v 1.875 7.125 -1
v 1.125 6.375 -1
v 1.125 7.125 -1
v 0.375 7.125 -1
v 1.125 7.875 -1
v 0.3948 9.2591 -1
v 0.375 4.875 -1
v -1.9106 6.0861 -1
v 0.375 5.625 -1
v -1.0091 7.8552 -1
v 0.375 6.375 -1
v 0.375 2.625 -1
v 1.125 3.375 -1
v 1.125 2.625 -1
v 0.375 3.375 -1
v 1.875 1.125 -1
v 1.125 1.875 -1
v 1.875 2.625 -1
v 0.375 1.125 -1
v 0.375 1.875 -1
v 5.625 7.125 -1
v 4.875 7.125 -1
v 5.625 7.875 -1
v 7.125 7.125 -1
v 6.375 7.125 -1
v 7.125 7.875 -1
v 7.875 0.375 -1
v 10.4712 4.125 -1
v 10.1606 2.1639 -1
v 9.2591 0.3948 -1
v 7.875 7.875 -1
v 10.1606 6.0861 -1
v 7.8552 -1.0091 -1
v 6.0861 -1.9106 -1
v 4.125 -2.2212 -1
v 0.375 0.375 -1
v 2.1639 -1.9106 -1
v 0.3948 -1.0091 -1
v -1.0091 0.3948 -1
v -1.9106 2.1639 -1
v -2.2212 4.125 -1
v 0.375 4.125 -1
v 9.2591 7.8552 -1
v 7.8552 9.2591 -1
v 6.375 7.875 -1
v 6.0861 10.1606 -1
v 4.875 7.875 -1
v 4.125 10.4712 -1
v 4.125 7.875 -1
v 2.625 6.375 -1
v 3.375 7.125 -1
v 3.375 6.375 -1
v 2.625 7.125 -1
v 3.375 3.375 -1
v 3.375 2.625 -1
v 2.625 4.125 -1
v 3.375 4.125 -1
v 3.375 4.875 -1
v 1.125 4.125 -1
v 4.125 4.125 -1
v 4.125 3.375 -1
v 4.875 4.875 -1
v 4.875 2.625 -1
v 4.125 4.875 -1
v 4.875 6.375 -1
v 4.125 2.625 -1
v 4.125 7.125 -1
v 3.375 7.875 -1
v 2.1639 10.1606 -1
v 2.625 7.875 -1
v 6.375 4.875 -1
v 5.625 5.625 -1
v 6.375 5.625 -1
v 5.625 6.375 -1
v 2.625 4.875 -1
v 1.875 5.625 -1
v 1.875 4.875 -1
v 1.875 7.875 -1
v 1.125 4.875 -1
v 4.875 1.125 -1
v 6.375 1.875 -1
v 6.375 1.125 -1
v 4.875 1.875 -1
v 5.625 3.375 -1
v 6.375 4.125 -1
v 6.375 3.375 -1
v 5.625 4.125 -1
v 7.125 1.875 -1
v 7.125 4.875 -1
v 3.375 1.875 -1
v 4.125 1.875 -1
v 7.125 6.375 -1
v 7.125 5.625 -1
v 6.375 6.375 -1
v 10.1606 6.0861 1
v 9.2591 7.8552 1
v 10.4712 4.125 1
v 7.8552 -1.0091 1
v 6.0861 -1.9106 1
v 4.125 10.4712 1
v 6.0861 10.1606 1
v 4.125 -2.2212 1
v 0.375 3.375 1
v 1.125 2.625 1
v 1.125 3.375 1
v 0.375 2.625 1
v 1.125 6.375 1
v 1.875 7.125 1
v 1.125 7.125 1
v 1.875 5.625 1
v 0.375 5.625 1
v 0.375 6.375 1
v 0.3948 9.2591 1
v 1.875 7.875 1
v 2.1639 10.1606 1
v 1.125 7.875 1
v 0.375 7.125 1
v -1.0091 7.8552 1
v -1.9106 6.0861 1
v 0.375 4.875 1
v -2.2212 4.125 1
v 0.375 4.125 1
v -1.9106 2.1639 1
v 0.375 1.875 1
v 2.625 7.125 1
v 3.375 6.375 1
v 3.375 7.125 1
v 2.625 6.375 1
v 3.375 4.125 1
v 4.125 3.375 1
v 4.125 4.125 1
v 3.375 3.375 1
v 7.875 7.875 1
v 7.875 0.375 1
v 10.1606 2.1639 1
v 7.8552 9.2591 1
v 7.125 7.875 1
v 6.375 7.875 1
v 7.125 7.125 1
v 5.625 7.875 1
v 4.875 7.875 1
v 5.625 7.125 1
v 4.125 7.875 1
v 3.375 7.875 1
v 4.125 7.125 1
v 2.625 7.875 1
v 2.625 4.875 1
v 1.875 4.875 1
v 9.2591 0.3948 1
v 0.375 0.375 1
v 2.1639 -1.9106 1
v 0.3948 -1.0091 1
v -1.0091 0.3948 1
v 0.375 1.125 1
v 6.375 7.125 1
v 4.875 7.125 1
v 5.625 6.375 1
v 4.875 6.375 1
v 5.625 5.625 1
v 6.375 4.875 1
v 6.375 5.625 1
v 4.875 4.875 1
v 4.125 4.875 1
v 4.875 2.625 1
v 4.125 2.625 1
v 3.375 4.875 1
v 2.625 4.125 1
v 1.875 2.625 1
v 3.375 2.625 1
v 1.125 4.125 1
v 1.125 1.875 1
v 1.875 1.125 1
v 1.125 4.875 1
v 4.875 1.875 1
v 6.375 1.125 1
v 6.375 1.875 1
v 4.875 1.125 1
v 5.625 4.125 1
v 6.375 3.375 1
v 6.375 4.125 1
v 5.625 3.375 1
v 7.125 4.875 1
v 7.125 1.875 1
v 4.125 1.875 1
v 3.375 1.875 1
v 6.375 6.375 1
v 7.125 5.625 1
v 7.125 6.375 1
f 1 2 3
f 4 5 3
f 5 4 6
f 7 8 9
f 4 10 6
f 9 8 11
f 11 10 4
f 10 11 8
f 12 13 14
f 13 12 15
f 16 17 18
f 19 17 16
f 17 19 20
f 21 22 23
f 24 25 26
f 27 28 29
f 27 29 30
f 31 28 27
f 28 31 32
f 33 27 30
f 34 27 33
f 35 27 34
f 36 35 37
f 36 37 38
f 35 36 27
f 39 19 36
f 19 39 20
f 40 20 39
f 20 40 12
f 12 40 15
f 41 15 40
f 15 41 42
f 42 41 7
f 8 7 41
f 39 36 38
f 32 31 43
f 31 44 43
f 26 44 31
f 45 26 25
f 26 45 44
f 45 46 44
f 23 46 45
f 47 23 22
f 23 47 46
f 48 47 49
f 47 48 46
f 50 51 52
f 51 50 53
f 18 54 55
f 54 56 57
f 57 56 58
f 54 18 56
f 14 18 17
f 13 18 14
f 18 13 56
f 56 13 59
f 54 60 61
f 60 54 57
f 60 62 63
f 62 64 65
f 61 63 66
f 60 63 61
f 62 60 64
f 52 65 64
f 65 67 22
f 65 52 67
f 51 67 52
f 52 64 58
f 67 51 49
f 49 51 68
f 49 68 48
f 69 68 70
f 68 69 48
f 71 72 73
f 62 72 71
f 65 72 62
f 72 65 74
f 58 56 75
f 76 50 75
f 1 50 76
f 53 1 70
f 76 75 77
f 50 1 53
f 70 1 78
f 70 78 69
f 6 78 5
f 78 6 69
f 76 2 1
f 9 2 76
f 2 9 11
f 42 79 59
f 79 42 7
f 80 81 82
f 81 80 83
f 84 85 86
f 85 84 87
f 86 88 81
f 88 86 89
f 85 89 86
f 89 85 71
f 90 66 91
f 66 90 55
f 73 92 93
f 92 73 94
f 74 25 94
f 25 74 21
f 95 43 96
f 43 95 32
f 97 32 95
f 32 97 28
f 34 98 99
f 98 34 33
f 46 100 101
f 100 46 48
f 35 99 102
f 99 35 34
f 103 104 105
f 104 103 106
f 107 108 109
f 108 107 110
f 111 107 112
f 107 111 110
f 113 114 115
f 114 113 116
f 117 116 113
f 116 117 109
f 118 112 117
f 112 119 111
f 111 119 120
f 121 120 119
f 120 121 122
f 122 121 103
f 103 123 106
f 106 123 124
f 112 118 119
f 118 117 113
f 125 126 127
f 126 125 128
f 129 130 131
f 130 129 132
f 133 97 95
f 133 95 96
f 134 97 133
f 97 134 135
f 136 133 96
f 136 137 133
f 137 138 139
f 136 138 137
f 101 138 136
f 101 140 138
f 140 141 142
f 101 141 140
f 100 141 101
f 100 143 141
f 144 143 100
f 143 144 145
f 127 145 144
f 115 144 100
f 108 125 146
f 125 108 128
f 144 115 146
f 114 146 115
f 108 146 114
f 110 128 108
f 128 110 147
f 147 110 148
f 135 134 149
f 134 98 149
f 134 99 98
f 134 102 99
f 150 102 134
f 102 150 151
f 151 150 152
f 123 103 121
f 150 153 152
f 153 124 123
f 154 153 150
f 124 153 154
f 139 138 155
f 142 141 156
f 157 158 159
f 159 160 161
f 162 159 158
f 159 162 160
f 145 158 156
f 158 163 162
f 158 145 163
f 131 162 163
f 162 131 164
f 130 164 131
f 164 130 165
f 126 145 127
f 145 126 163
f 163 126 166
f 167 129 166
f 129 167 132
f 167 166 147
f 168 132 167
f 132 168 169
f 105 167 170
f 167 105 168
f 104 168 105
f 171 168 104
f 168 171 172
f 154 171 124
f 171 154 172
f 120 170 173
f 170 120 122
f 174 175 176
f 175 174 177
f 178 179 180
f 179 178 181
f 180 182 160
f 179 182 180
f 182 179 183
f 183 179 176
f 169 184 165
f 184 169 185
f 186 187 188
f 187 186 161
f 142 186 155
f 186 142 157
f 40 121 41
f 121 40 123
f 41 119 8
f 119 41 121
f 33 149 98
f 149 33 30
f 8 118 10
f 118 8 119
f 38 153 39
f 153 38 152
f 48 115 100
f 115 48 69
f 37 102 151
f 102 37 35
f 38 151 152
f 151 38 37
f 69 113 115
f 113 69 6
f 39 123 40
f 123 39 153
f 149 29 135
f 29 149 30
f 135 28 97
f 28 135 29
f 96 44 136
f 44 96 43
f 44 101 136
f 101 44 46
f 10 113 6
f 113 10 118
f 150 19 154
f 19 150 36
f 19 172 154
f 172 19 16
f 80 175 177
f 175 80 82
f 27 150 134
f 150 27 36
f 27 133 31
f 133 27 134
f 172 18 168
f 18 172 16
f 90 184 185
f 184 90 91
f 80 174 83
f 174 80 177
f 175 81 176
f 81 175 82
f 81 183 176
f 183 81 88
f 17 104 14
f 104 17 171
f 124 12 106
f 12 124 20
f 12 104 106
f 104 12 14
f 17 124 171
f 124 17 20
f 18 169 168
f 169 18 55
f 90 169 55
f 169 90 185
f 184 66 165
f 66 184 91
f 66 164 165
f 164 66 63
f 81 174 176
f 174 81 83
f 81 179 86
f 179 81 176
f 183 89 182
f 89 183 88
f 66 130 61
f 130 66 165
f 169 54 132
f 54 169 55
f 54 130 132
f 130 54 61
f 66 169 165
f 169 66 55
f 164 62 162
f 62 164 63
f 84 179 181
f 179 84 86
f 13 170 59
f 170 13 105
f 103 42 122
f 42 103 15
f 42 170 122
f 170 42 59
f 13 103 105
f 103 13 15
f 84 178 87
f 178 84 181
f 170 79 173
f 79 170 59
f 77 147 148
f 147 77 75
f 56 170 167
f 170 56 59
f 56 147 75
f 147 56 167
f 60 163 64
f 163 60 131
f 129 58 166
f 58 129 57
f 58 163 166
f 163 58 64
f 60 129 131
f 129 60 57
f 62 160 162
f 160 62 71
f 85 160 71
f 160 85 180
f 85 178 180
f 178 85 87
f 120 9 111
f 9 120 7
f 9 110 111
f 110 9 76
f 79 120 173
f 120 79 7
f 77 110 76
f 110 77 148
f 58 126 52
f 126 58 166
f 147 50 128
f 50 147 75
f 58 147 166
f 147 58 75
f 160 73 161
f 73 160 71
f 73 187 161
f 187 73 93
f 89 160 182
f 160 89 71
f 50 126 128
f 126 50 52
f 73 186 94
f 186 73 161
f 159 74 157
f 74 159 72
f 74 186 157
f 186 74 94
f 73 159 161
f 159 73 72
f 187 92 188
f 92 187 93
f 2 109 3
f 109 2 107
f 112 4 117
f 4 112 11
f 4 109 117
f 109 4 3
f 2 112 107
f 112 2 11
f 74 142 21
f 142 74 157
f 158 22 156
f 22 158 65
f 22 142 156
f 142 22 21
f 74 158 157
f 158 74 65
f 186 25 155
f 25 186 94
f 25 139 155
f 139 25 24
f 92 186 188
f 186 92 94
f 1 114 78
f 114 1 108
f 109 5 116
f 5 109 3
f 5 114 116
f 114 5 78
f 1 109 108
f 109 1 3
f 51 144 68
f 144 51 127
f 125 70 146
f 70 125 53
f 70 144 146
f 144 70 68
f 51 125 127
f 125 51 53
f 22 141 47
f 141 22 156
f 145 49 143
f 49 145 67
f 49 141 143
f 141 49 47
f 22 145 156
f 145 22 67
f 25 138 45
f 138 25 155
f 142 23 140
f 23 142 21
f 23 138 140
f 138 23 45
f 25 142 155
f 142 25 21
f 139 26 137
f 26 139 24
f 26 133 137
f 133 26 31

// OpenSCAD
rotate([0,0,0])difference(){translate([4.125,4.125,0])  cylinder(r=6.34615384615385,h=2, center=true);
translate([0.75,0.75,0])  cube(size = [0.75,0.75,2], center=true);
translate([1.5,0.75,0])  cube(size = [0.75,0.75,2], center=true);
translate([2.25,0.75,0])  cube(size = [0.75,0.75,2], center=true);
translate([3,0.75,0])  cube(size = [0.75,0.75,2], center=true);
translate([3.75,0.75,0])  cube(size = [0.75,0.75,2], center=true);
translate([4.5,0.75,0])  cube(size = [0.75,0.75,2], center=true);
translate([5.25,0.75,0])  cube(size = [0.75,0.75,2], center=true);
translate([6,0.75,0])  cube(size = [0.75,0.75,2], center=true);
translate([6.75,0.75,0])  cube(size = [0.75,0.75,2], center=true);
translate([7.5,0.75,0])  cube(size = [0.75,0.75,2], center=true);
translate([7.5,0.75,0])  cube(size = [0.75,0.75,2], center=true);
translate([7.5,0.75,0])  cube(size = [0.75,0.75,2], center=true);
translate([2.25,1.5,0])  cube(size = [0.75,0.75,2], center=true);
translate([3,1.5,0])  cube(size = [0.75,0.75,2], center=true);
translate([3.75,1.5,0])  cube(size = [0.75,0.75,2], center=true);
translate([4.5,1.5,0])  cube(size = [0.75,0.75,2], center=true);
translate([4.5,1.5,0])  cube(size = [0.75,0.75,2], center=true);
translate([4.5,1.5,0])  cube(size = [0.75,0.75,2], center=true);
translate([6.75,1.5,0])  cube(size = [0.75,0.75,2], center=true);
translate([7.5,1.5,0])  cube(size = [0.75,0.75,2], center=true);
translate([0.75,2.25,0])  cube(size = [0.75,0.75,2], center=true);
translate([0.75,2.25,0])  cube(size = [0.75,0.75,2], center=true);
translate([2.25,2.25,0])  cube(size = [0.75,0.75,2], center=true);
translate([3,2.25,0])  cube(size = [0.75,0.75,2], center=true);
translate([3,2.25,0])  cube(size = [0.75,0.75,2], center=true);
translate([4.5,2.25,0])  cube(size = [0.75,0.75,2], center=true);
translate([5.25,2.25,0])  cube(size = [0.75,0.75,2], center=true);
translate([6,2.25,0])  cube(size = [0.75,0.75,2], center=true);
translate([6,2.25,0])  cube(size = [0.75,0.75,2], center=true);
translate([7.5,2.25,0])  cube(size = [0.75,0.75,2], center=true);
translate([7.5,2.25,0])  cube(size = [0.75,0.75,2], center=true);
translate([7.5,2.25,0])  cube(size = [0.75,0.75,2], center=true);
translate([7.5,2.25,0])  cube(size = [0.75,0.75,2], center=true);
translate([7.5,2.25,0])  cube(size = [0.75,0.75,2], center=true);
translate([3.75,3,0])  cube(size = [0.75,0.75,2], center=true);
translate([3.75,3,0])  cube(size = [0.75,0.75,2], center=true);
translate([5.25,3,0])  cube(size = [0.75,0.75,2], center=true);
translate([6,3,0])  cube(size = [0.75,0.75,2], center=true);
translate([6,3,0])  cube(size = [0.75,0.75,2], center=true);
translate([7.5,3,0])  cube(size = [0.75,0.75,2], center=true);
translate([0.75,3.75,0])  cube(size = [0.75,0.75,2], center=true);
translate([0.75,3.75,0])  cube(size = [0.75,0.75,2], center=true);
translate([0.75,3.75,0])  cube(size = [0.75,0.75,2], center=true);
translate([0.75,3.75,0])  cube(size = [0.75,0.75,2], center=true);
translate([0.75,3.75,0])  cube(size = [0.75,0.75,2], center=true);
translate([0.75,3.75,0])  cube(size = [0.75,0.75,2], center=true);
translate([5.25,3.75,0])  cube(size = [0.75,0.75,2], center=true);
translate([5.25,3.75,0])  cube(size = [0.75,0.75,2], center=true);
translate([5.25,3.75,0])  cube(size = [0.75,0.75,2], center=true);
translate([7.5,3.75,0])  cube(size = [0.75,0.75,2], center=true);
translate([7.5,3.75,0])  cube(size = [0.75,0.75,2], center=true);
translate([1.5,4.5,0])  cube(size = [0.75,0.75,2], center=true);
translate([2.25,4.5,0])  cube(size = [0.75,0.75,2], center=true);
translate([2.25,4.5,0])  cube(size = [0.75,0.75,2], center=true);
translate([3.75,4.5,0])  cube(size = [0.75,0.75,2], center=true);
translate([3.75,4.5,0])  cube(size = [0.75,0.75,2], center=true);
translate([5.25,4.5,0])  cube(size = [0.75,0.75,2], center=true);
translate([6,4.5,0])  cube(size = [0.75,0.75,2], center=true);
translate([6,4.5,0])  cube(size = [0.75,0.75,2], center=true);
translate([7.5,4.5,0])  cube(size = [0.75,0.75,2], center=true);
translate([0.75,5.25,0])  cube(size = [0.75,0.75,2], center=true);
translate([1.5,5.25,0])  cube(size = [0.75,0.75,2], center=true);
translate([1.5,5.25,0])  cube(size = [0.75,0.75,2], center=true);
translate([3,5.25,0])  cube(size = [0.75,0.75,2], center=true);
translate([3,5.25,0])  cube(size = [0.75,0.75,2], center=true);
translate([3,5.25,0])  cube(size = [0.75,0.75,2], center=true);
translate([3,5.25,0])  cube(size = [0.75,0.75,2], center=true);
translate([3,5.25,0])  cube(size = [0.75,0.75,2], center=true);
translate([6.75,5.25,0])  cube(size = [0.75,0.75,2], center=true);
translate([7.5,5.25,0])  cube(size = [0.75,0.75,2], center=true);
translate([7.5,5.25,0])  cube(size = [0.75,0.75,2], center=true);
translate([7.5,5.25,0])  cube(size = [0.75,0.75,2], center=true);
translate([7.5,5.25,0])  cube(size = [0.75,0.75,2], center=true);
translate([3,6,0])  cube(size = [0.75,0.75,2], center=true);
translate([3,6,0])  cube(size = [0.75,0.75,2], center=true);
translate([3,6,0])  cube(size = [0.75,0.75,2], center=true);
translate([3,6,0])  cube(size = [0.75,0.75,2], center=true);
translate([6,6,0])  cube(size = [0.75,0.75,2], center=true);
translate([6,6,0])  cube(size = [0.75,0.75,2], center=true);
translate([7.5,6,0])  cube(size = [0.75,0.75,2], center=true);
translate([0.75,6.75,0])  cube(size = [0.75,0.75,2], center=true);
translate([0.75,6.75,0])  cube(size = [0.75,0.75,2], center=true);
translate([0.75,6.75,0])  cube(size = [0.75,0.75,2], center=true);
translate([0.75,6.75,0])  cube(size = [0.75,0.75,2], center=true);
translate([0.75,6.75,0])  cube(size = [0.75,0.75,2], center=true);
translate([0.75,6.75,0])  cube(size = [0.75,0.75,2], center=true);
translate([5.25,6.75,0])  cube(size = [0.75,0.75,2], center=true);
translate([5.25,6.75,0])  cube(size = [0.75,0.75,2], center=true);
translate([6.75,6.75,0])  cube(size = [0.75,0.75,2], center=true);
translate([7.5,6.75,0])  cube(size = [0.75,0.75,2], center=true);
translate([7.5,6.75,0])  cube(size = [0.75,0.75,2], center=true);
translate([1.5,7.5,0])  cube(size = [0.75,0.75,2], center=true);
translate([1.5,7.5,0])  cube(size = [0.75,0.75,2], center=true);
translate([3,7.5,0])  cube(size = [0.75,0.75,2], center=true);
translate([3,7.5,0])  cube(size = [0.75,0.75,2], center=true);
translate([4.5,7.5,0])  cube(size = [0.75,0.75,2], center=true);
translate([4.5,7.5,0])  cube(size = [0.75,0.75,2], center=true);
translate([6,7.5,0])  cube(size = [0.75,0.75,2], center=true);
translate([6,7.5,0])  cube(size = [0.75,0.75,2], center=true);
translate([7.5,7.5,0])  cube(size = [0.75,0.75,2], center=true);
}
